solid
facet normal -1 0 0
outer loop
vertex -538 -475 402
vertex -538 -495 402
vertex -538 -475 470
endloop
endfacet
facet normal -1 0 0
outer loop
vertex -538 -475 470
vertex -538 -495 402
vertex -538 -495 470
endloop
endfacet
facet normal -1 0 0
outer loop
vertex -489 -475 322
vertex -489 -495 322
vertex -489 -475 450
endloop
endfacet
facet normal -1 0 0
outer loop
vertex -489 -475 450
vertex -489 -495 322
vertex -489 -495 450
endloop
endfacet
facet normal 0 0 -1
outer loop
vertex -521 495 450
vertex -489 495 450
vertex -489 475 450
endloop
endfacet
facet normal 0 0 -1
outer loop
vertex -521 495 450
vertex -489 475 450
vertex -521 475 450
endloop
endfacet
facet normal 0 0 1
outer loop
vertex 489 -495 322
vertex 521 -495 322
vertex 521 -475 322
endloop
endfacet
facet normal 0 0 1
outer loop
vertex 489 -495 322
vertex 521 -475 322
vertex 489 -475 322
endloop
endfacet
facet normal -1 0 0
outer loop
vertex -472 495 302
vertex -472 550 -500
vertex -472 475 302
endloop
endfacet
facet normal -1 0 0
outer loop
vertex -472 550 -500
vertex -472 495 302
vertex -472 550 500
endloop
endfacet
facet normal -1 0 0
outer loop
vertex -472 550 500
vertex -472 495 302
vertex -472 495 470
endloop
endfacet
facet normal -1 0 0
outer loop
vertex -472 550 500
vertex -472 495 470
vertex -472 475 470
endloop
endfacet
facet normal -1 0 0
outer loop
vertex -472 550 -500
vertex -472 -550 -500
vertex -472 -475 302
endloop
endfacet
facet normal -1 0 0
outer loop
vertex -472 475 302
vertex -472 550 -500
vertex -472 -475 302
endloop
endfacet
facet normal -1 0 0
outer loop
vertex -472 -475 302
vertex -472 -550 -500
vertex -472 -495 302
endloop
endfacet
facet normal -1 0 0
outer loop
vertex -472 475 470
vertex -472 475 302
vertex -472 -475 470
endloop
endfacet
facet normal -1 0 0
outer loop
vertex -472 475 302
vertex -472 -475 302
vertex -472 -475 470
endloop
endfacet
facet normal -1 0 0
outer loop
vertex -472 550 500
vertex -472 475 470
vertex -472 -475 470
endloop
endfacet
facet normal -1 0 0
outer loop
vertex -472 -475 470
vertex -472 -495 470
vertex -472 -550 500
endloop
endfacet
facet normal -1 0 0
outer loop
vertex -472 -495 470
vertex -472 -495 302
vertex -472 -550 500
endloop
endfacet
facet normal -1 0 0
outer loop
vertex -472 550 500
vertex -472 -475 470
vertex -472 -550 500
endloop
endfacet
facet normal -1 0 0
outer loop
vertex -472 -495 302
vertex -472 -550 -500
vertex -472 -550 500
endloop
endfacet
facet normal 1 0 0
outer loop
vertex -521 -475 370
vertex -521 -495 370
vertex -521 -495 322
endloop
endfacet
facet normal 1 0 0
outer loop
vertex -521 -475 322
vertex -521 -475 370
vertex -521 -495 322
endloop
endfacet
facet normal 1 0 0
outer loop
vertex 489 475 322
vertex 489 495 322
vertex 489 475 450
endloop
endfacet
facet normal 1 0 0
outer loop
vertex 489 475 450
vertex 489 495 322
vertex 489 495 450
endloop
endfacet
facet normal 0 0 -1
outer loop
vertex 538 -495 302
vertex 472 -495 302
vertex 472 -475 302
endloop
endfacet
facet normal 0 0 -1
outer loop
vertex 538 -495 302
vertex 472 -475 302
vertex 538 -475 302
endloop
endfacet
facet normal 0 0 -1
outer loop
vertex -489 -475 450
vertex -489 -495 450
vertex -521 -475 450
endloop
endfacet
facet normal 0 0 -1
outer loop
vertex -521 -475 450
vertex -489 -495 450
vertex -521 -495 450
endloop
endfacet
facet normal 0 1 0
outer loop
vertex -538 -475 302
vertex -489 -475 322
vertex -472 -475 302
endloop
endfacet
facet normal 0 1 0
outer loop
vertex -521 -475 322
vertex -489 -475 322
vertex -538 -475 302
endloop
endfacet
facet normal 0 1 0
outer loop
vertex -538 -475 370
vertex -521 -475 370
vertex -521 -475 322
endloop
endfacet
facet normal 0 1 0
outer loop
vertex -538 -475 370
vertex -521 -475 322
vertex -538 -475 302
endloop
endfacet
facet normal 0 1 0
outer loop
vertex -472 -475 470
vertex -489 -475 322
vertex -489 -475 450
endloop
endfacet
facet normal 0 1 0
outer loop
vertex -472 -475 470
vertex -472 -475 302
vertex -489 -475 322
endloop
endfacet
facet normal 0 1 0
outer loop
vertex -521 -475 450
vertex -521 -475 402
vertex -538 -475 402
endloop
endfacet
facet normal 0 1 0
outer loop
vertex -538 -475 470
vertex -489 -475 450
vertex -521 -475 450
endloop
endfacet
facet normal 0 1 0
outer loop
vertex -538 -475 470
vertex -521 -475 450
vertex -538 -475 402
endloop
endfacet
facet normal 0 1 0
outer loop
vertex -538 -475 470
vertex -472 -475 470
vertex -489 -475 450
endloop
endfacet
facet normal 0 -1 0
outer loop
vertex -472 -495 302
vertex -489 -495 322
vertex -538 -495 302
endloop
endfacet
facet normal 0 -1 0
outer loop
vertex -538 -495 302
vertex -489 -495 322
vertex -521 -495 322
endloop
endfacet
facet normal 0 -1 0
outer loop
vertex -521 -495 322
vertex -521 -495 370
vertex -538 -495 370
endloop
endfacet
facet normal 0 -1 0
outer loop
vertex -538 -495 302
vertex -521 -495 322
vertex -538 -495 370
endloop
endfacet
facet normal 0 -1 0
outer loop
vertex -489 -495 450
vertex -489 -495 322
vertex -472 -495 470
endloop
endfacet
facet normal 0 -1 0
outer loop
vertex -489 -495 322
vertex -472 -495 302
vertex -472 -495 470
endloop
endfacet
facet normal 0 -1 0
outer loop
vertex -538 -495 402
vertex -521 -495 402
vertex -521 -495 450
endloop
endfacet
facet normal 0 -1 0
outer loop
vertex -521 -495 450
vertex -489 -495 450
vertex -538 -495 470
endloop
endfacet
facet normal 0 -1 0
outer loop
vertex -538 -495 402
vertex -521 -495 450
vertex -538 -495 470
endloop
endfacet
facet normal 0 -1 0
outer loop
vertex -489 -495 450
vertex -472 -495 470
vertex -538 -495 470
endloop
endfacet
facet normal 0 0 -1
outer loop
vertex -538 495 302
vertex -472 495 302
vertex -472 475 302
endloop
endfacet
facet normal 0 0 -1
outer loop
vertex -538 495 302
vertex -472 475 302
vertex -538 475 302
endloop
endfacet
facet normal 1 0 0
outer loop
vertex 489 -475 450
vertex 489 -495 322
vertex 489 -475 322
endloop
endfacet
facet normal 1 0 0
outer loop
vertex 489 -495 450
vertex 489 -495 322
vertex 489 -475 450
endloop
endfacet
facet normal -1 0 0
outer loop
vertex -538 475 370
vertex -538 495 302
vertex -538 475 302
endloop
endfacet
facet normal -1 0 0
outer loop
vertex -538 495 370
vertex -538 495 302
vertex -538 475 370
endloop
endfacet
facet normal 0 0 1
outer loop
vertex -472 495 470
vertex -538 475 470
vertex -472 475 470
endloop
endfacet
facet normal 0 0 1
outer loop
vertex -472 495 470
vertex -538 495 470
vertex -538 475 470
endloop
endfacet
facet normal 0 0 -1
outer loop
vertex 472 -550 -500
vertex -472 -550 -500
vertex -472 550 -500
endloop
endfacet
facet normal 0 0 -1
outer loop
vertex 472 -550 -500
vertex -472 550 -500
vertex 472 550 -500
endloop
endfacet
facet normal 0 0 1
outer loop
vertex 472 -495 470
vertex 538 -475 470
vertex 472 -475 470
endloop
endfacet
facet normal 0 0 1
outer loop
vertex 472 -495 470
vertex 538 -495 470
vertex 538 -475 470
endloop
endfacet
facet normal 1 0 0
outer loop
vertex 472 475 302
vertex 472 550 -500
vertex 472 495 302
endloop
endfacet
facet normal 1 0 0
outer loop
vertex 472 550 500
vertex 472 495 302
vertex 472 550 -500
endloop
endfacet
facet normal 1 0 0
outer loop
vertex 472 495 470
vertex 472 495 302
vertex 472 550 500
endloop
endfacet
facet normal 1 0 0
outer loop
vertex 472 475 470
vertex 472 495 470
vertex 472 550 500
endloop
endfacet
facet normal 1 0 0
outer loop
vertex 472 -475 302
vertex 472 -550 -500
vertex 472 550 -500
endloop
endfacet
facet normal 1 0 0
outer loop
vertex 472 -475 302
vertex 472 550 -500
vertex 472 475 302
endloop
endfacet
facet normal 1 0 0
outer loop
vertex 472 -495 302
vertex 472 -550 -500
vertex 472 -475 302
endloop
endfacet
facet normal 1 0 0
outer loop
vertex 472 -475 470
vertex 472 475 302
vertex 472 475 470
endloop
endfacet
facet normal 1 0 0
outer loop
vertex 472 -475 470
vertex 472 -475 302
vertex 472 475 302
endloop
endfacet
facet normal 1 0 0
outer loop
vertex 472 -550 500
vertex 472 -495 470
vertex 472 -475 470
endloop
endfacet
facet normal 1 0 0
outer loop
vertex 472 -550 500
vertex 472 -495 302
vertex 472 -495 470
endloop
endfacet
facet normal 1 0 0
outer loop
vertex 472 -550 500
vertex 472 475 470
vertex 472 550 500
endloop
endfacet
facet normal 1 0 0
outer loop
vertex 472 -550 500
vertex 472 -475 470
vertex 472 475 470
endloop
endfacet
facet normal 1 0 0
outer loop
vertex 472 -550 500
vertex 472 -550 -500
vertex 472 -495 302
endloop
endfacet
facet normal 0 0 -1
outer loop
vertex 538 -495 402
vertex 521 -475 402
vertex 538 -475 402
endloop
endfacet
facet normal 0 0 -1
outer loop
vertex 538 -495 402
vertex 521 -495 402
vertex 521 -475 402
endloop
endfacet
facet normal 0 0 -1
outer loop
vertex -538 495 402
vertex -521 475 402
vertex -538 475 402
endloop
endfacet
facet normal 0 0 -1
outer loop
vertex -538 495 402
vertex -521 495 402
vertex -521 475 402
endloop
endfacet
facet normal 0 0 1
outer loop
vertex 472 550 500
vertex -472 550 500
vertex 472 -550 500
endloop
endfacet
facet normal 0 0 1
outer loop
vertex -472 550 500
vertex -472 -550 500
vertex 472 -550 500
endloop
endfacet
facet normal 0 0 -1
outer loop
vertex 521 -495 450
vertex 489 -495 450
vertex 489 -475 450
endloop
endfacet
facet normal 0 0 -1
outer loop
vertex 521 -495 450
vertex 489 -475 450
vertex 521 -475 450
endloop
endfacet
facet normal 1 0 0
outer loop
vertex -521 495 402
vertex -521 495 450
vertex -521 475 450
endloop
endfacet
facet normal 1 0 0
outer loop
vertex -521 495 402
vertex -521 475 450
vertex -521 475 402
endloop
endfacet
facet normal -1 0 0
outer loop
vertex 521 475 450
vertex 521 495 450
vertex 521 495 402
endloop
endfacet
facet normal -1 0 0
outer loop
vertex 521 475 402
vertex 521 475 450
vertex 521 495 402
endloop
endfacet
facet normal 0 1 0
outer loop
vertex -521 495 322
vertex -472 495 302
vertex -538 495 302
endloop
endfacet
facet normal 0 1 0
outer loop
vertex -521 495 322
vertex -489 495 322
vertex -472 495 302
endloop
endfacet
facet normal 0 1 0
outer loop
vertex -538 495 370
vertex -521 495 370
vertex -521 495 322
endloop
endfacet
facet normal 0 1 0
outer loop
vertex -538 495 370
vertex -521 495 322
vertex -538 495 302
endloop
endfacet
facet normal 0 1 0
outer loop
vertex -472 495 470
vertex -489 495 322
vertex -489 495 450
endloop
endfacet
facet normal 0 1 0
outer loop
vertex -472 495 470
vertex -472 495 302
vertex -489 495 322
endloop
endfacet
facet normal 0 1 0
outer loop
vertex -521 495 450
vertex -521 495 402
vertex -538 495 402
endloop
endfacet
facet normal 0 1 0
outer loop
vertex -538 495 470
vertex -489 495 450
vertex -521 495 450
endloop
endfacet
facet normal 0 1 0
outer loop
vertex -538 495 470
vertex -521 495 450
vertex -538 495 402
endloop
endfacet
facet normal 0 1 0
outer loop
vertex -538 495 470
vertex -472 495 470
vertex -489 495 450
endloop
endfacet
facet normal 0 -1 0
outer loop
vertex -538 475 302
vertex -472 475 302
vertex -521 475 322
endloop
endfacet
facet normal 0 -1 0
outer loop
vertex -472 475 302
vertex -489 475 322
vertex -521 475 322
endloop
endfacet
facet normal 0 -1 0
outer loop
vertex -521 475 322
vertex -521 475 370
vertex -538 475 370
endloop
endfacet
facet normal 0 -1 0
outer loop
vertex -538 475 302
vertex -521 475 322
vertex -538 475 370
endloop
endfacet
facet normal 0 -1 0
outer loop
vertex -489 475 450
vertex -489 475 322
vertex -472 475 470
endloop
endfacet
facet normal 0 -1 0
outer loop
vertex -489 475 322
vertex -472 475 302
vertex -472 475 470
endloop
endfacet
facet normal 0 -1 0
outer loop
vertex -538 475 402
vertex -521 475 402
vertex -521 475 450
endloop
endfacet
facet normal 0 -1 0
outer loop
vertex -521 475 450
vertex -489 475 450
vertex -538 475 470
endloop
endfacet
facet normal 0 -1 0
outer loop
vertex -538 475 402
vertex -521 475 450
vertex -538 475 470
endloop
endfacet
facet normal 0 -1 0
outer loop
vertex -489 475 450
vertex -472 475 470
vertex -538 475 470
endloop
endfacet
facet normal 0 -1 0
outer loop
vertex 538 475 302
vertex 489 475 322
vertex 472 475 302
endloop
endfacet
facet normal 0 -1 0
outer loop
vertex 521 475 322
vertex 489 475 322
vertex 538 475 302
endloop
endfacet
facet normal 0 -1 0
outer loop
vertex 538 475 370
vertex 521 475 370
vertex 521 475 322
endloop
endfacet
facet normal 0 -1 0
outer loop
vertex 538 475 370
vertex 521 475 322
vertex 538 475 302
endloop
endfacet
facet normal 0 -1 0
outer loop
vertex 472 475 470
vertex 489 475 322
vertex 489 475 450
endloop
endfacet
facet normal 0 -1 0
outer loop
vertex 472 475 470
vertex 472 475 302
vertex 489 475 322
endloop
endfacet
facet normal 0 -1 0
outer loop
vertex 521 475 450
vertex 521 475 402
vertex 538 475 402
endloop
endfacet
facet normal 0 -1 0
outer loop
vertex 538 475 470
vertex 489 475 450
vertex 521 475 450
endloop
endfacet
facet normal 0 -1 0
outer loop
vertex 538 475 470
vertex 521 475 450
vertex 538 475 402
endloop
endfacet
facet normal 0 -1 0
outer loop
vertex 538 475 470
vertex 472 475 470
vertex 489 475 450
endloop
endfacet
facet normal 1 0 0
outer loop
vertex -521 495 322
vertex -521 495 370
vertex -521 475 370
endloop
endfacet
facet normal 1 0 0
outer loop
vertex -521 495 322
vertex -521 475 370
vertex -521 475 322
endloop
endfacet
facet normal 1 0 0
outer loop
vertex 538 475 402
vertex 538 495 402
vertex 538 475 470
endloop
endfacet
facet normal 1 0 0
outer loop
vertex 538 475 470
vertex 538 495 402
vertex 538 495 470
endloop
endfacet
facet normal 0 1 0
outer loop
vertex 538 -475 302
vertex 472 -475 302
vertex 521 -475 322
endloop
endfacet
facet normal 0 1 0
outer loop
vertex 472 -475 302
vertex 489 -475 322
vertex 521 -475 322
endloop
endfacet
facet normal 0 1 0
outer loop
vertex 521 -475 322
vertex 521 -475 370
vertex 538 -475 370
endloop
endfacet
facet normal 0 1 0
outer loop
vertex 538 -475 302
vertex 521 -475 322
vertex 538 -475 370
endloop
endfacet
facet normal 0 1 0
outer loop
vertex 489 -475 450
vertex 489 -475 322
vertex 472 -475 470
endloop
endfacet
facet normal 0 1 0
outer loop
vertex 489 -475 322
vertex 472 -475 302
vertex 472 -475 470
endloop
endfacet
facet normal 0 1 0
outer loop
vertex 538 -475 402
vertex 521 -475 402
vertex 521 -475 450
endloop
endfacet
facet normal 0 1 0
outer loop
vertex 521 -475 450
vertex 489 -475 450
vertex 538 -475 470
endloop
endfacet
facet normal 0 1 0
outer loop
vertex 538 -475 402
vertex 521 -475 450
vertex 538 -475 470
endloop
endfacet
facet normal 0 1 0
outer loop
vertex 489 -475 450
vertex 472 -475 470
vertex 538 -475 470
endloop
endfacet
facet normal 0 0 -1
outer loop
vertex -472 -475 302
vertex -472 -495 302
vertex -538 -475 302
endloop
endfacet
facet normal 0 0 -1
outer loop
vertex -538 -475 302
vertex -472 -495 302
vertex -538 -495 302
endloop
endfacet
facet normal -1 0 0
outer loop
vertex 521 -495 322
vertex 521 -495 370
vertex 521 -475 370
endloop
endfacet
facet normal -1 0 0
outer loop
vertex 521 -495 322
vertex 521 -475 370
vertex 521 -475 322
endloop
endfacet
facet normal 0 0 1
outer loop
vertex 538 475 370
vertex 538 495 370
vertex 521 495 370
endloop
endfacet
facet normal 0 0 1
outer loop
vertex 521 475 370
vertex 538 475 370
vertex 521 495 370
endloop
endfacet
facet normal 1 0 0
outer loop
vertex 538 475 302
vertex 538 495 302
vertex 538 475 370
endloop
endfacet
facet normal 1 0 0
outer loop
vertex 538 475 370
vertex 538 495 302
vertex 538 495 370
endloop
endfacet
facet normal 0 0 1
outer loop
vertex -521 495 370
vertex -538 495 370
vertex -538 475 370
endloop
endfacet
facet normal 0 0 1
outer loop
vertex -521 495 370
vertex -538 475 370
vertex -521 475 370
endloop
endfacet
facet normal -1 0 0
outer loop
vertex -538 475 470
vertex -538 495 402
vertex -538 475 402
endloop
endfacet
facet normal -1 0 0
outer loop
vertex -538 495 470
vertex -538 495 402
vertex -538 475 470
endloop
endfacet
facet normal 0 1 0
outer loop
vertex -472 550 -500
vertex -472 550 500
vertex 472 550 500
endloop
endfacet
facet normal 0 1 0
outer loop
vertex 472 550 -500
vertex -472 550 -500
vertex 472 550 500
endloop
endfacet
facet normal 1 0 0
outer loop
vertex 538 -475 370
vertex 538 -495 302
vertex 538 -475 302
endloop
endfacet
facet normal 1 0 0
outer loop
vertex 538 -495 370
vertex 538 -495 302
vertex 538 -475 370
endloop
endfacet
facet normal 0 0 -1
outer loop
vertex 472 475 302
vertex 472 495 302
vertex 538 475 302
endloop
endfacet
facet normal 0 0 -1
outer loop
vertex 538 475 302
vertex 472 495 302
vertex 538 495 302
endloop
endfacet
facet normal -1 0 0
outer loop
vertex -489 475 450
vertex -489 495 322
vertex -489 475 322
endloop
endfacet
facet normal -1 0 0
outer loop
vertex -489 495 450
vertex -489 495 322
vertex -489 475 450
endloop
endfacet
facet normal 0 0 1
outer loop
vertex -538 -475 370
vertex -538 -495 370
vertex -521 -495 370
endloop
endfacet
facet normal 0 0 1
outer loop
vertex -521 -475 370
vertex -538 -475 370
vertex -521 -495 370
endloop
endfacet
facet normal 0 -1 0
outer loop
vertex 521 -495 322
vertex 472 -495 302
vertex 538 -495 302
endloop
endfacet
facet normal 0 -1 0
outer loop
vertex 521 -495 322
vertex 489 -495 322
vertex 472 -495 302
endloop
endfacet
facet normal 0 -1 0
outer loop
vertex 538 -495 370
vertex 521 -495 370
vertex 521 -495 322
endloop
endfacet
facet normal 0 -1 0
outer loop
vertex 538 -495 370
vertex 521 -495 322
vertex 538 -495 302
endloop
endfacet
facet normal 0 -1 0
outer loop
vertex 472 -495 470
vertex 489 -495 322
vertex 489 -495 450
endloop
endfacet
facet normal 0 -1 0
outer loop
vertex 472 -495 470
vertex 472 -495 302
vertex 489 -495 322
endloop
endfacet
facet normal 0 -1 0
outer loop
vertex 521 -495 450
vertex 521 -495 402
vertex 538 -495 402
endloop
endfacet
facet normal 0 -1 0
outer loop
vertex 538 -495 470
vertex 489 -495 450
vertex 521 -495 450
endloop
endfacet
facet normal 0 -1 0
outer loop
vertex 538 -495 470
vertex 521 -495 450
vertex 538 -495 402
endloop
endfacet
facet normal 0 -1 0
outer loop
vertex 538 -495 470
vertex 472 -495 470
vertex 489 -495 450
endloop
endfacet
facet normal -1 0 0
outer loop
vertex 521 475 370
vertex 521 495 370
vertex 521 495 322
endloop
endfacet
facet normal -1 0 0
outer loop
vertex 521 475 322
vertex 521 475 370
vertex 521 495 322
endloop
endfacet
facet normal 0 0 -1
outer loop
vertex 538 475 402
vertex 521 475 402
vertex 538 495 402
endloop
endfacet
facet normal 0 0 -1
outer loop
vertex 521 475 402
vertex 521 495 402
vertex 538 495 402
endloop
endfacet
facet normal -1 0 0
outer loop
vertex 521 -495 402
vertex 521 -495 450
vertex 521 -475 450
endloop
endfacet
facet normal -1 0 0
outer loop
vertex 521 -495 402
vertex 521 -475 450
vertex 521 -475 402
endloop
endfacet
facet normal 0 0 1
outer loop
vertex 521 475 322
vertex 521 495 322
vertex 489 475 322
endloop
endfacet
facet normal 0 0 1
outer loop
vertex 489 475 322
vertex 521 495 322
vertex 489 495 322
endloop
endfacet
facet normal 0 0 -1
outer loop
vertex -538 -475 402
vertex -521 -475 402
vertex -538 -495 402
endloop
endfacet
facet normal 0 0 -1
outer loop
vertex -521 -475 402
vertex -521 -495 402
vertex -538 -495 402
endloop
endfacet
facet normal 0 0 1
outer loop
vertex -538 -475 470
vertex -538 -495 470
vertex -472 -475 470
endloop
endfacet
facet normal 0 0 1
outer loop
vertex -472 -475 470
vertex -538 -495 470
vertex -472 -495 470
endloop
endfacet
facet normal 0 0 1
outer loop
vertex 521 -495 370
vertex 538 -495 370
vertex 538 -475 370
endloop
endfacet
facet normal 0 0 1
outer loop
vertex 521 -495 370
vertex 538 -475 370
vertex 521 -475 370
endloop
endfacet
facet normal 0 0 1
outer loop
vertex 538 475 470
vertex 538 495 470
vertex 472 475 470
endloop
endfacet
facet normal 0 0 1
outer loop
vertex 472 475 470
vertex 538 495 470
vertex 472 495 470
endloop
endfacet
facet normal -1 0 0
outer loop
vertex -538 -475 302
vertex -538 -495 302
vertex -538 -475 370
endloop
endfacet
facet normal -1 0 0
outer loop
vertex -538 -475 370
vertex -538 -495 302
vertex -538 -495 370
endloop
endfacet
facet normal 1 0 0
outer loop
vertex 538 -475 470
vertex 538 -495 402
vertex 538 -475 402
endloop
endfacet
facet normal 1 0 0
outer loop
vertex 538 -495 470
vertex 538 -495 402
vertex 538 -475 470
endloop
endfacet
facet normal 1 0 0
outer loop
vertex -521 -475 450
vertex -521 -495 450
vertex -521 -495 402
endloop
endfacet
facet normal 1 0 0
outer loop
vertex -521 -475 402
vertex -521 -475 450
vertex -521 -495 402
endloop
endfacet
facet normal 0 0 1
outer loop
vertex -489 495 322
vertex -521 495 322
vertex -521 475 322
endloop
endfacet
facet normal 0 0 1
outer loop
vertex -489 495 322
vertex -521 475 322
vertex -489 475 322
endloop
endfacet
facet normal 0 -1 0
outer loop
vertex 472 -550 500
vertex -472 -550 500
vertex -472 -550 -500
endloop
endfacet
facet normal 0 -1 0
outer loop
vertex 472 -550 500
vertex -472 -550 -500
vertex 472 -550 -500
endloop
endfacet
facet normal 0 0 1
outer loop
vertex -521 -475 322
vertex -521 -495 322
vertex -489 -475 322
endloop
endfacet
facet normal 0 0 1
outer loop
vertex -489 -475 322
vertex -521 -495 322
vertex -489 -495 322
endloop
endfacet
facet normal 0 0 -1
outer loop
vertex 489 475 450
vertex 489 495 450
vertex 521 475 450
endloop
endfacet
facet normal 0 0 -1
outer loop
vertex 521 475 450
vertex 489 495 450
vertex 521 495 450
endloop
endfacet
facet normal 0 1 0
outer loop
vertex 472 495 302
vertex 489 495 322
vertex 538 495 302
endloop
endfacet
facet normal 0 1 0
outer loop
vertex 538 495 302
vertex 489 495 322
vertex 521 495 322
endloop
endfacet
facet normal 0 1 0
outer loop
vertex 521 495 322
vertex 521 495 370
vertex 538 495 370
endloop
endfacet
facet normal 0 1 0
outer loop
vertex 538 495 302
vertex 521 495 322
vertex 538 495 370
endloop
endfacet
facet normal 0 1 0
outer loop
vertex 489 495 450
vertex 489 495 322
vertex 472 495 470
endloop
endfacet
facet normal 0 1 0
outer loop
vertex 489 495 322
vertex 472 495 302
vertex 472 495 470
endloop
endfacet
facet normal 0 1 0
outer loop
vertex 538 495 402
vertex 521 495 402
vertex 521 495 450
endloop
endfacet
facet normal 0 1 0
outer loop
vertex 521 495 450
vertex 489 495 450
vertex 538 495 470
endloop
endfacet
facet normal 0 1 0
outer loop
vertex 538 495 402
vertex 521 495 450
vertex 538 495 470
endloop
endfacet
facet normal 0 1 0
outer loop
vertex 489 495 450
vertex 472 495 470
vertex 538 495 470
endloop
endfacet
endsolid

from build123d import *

# Parameters (mm, degrees)
F0_W             = 944
F0_H             = 1000
F1_DEPTH         = 550
F4_DEPTH         = 10
F4_COPIES2_COUNT = 2


# Not quite as in the source:
# - a pattern or mirror of a feature is missing from the dataset's text; its kind, count and spacing are read off the source's solid


with BuildPart() as f1:
    # F0 (on Front) → F1 (new body, symmetric)
    with BuildSketch(Plane.XZ):
        Rectangle(F0_W, F0_H)
    extrude(amount=F1_DEPTH, both=True)

    # F3 (on offset) → F4 (join, symmetric)
    with BuildSketch(Plane.XZ.offset(485)):
        Polygon((538, 470), (472, 470), (472, 302), (538, 302), (538, 370), (521, 370), (521, 322), (489, 322), (489, 450), (521, 450), (521, 402), (538, 402), align=None)
    f4 = extrude(amount=F4_DEPTH, both=True)

    # F4_copies: F4 across plane
    add(f4.mirror(Plane.ZX))

    # F4_copies1: F4 across plane
    add(f4.mirror(Plane(origin=(0, 0, 0), x_dir=(0, 0, -1), z_dir=(-1, 0, 0))))

    # F4_copies2: F4 ×2 about axis
    f4_copies2_axis = Axis((0, 0, 0), (0, 0, 1))
    for i in range(1, F4_COPIES2_COUNT):
        add(f4.rotate(f4_copies2_axis, i * 360 / F4_COPIES2_COUNT))


solid = f1.part
